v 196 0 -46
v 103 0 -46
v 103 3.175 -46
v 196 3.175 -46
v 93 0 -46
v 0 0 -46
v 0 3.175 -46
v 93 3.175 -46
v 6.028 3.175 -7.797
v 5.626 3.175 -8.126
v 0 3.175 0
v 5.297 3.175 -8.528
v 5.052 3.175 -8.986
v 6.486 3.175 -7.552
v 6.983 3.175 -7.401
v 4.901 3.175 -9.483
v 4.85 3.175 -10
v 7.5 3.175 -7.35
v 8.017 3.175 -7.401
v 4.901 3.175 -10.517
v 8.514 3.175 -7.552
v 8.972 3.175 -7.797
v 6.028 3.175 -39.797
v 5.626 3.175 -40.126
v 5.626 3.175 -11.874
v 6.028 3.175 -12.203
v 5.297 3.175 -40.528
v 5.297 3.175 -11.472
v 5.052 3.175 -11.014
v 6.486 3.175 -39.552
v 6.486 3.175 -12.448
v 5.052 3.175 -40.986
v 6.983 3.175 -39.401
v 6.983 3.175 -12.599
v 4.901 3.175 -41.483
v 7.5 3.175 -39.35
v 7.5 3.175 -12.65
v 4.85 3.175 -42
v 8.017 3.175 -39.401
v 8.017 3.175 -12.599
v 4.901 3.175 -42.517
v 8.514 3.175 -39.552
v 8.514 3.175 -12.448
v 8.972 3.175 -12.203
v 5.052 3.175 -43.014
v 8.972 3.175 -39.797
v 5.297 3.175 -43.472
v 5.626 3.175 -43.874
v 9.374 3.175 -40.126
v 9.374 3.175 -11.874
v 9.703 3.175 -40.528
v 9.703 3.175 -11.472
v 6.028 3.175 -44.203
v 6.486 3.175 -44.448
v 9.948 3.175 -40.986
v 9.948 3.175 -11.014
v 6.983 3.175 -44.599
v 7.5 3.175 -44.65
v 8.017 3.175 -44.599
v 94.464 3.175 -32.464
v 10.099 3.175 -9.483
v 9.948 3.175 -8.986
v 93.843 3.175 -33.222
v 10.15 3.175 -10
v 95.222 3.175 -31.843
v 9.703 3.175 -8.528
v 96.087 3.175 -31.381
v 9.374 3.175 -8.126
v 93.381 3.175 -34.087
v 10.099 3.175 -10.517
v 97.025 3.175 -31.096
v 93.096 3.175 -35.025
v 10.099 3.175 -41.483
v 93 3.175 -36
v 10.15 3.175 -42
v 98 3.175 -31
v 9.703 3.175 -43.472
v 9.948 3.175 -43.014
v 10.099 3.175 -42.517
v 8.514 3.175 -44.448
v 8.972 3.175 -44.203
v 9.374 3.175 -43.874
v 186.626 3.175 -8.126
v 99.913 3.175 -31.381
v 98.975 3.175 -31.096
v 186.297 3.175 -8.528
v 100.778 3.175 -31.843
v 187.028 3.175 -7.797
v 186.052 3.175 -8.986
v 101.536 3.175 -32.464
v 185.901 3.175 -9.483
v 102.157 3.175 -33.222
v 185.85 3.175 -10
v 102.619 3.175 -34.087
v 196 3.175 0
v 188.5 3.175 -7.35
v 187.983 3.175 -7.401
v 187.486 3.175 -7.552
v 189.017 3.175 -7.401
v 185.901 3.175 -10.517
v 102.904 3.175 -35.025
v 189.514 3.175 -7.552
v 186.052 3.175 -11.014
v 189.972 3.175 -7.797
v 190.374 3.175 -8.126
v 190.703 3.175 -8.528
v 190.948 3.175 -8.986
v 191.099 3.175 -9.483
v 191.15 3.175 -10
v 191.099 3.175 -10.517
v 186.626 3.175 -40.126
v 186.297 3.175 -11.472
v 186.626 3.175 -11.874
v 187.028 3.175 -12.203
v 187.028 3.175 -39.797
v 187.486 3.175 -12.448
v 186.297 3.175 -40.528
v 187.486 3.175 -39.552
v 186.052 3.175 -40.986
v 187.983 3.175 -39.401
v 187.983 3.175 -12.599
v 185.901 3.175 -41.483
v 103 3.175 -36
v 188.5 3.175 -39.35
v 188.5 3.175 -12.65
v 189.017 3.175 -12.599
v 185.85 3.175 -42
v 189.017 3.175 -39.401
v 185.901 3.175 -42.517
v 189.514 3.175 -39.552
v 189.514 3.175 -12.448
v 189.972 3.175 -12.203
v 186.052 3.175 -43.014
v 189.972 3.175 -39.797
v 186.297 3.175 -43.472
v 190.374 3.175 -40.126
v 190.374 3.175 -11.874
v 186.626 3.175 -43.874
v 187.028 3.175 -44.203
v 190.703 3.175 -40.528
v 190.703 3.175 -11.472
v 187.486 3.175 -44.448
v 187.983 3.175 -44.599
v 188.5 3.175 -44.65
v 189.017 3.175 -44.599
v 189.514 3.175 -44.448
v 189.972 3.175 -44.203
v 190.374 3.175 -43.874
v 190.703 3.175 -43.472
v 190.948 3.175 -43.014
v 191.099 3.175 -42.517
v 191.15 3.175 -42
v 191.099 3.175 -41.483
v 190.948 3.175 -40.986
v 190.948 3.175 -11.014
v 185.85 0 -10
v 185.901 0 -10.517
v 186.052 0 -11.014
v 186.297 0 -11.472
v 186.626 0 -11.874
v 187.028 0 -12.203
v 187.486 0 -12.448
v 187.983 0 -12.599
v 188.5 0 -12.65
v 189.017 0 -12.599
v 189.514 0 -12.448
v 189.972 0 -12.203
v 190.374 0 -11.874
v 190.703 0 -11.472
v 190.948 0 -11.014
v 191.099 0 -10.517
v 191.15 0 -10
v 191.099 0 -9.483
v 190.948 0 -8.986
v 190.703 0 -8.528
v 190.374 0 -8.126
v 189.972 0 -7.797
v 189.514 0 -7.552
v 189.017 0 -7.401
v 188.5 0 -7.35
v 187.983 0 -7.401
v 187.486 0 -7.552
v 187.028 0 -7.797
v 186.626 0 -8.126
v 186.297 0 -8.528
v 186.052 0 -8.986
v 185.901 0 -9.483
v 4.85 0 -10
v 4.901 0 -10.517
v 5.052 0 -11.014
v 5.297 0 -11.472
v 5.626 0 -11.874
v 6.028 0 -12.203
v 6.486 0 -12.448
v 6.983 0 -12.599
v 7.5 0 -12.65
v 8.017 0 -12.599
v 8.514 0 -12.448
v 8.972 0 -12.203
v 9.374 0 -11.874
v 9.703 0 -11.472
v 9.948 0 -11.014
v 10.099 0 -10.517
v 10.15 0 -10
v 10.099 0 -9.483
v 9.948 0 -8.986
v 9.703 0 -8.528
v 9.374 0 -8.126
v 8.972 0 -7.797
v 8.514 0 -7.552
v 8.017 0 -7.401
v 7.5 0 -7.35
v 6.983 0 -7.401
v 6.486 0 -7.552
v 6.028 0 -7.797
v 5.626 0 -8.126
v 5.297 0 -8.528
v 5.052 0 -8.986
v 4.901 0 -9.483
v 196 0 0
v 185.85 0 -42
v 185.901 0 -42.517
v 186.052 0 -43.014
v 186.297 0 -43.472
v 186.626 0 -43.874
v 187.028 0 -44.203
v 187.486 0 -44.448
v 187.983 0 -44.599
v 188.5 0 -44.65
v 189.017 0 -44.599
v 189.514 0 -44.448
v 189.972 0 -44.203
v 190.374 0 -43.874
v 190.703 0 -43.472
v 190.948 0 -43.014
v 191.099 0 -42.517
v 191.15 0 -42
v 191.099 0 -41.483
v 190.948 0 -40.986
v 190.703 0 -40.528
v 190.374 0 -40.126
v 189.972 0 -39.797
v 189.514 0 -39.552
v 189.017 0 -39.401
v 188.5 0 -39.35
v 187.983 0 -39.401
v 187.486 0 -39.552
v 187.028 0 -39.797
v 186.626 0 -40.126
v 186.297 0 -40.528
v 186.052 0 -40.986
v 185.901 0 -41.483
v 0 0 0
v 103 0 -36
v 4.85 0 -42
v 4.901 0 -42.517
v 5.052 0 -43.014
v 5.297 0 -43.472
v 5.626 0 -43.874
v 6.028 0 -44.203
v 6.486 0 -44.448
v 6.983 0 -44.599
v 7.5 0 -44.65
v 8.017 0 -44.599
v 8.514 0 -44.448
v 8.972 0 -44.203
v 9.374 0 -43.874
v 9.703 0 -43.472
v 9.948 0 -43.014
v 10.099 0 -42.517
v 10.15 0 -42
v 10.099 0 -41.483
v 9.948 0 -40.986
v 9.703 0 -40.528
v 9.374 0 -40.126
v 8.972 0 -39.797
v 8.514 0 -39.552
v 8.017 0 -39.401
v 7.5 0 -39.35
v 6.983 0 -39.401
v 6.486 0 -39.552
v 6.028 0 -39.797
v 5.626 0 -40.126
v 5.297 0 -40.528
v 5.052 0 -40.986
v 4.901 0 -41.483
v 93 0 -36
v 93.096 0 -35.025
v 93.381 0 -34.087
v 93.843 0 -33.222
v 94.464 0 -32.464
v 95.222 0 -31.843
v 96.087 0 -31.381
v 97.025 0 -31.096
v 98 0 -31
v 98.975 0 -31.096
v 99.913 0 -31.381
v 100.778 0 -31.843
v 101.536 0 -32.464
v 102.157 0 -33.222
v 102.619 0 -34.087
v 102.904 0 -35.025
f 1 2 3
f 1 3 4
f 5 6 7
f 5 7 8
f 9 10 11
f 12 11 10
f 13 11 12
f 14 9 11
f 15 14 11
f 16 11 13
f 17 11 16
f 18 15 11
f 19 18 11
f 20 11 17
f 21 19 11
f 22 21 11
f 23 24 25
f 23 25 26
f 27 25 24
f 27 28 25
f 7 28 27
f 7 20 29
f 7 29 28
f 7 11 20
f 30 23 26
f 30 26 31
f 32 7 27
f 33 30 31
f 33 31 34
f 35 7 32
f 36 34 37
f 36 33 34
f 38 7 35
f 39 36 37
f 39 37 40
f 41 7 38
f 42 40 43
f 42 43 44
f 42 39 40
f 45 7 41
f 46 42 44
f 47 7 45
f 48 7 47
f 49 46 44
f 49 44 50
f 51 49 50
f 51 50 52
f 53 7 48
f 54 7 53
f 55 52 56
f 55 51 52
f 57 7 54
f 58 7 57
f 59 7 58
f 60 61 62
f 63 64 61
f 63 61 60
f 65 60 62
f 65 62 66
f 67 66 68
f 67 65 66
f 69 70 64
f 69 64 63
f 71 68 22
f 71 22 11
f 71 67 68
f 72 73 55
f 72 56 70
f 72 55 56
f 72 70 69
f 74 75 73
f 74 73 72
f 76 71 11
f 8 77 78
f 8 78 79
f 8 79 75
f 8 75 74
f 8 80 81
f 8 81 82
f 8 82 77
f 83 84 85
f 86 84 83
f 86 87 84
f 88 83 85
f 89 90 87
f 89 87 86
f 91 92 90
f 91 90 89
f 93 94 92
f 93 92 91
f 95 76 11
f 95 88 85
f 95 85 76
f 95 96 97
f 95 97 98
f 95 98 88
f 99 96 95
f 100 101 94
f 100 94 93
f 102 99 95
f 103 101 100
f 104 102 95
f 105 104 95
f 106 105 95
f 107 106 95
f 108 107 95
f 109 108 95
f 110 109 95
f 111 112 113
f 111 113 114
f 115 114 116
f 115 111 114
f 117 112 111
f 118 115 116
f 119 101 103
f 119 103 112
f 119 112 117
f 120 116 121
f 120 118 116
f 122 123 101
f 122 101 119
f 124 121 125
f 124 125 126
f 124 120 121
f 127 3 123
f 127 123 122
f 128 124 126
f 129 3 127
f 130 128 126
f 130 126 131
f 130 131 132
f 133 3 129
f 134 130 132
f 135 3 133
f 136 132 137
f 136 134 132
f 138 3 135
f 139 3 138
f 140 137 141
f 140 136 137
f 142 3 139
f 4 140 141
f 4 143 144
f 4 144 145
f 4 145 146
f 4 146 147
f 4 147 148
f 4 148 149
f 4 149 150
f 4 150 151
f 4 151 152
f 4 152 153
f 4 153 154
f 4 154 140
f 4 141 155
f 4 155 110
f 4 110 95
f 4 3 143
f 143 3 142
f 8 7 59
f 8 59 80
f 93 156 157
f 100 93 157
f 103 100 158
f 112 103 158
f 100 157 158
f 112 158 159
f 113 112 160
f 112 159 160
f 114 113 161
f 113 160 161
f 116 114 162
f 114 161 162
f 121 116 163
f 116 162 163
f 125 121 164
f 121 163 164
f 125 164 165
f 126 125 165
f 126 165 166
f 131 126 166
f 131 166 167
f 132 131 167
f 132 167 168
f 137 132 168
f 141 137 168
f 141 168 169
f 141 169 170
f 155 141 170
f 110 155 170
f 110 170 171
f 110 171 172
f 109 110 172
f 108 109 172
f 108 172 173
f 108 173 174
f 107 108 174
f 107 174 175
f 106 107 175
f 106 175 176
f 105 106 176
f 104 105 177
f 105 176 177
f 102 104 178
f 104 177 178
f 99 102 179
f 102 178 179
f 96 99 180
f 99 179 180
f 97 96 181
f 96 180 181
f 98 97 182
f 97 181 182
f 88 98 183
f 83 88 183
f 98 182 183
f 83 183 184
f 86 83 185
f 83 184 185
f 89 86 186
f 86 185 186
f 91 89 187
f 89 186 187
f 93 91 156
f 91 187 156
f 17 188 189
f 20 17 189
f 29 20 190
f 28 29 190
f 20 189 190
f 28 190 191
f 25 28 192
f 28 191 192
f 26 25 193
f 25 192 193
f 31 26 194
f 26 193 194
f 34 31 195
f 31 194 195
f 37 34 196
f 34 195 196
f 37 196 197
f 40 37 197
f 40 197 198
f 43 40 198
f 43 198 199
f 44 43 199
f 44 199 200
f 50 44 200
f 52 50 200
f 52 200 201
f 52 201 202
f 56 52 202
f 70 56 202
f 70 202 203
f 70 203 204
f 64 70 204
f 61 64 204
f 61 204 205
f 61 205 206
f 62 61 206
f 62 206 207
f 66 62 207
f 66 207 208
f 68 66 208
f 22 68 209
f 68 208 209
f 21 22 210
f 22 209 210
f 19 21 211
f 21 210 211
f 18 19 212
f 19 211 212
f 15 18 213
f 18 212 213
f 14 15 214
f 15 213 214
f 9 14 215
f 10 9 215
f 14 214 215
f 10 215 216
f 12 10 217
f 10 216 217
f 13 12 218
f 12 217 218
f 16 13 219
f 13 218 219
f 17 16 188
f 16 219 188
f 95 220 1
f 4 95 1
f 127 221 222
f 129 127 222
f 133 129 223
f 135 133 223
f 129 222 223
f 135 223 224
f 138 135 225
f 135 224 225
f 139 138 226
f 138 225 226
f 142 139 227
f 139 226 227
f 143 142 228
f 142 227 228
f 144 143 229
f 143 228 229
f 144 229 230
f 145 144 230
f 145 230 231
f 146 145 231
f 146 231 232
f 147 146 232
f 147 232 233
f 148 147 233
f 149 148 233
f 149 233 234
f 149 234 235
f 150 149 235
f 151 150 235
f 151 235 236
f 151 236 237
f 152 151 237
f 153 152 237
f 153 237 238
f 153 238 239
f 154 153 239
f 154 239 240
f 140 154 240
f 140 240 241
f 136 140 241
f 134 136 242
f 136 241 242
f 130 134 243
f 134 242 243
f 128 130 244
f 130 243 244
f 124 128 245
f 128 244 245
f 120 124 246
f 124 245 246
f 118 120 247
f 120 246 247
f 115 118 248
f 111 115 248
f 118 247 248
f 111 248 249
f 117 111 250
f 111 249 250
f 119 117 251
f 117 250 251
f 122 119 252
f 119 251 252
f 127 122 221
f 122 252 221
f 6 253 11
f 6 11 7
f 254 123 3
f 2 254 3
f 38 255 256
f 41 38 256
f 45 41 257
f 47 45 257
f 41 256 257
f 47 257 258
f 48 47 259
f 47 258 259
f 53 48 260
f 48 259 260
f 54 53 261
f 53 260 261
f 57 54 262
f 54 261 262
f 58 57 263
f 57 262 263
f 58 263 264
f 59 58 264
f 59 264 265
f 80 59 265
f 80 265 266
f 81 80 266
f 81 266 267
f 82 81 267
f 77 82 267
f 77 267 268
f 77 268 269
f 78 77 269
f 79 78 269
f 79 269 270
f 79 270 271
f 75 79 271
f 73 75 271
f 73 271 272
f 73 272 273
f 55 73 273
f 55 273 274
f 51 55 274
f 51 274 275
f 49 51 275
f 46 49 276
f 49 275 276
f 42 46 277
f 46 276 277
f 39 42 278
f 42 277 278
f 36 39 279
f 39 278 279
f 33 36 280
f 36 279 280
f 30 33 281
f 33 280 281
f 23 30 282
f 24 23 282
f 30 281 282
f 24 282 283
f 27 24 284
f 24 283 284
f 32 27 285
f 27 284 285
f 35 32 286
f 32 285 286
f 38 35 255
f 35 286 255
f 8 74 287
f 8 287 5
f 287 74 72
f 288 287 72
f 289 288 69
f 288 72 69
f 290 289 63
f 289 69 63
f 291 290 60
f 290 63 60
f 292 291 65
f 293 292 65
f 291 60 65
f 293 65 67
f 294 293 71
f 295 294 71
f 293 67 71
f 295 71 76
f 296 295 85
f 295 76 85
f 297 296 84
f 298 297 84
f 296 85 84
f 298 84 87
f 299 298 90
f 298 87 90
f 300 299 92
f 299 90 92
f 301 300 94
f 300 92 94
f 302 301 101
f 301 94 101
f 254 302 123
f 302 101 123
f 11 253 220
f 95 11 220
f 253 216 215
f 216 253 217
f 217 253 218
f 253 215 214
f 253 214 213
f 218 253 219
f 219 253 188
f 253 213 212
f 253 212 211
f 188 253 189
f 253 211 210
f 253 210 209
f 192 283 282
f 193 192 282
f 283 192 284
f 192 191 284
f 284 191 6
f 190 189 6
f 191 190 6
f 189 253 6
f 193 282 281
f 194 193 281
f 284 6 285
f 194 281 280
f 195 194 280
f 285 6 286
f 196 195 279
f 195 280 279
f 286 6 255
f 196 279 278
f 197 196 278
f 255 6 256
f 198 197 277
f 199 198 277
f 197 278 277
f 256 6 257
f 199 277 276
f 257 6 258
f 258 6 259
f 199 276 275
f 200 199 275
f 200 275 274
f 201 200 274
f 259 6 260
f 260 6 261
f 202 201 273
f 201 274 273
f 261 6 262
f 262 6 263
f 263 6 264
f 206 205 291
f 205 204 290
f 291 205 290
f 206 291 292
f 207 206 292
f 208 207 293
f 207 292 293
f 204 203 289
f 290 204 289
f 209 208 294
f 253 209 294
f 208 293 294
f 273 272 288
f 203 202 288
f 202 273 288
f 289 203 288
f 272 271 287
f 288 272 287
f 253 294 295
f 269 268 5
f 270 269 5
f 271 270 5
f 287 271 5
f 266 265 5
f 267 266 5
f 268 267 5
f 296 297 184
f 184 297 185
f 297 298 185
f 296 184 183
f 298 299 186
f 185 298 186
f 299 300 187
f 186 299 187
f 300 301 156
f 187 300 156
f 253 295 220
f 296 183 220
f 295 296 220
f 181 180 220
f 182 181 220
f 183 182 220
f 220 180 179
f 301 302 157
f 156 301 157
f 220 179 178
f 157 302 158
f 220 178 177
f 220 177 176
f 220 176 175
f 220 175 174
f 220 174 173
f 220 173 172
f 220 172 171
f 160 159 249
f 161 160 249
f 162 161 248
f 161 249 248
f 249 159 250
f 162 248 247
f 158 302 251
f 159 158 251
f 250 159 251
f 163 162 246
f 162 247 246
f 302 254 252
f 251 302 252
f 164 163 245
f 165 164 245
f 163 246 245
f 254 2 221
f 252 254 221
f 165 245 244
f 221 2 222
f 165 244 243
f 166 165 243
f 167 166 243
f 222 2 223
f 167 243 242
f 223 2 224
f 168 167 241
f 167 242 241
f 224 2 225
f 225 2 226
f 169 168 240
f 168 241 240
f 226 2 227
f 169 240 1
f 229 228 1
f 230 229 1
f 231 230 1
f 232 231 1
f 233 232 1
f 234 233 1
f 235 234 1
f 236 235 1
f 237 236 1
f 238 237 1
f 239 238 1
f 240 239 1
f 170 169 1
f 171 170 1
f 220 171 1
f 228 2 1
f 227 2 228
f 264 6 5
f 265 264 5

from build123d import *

# Parameters (mm, degrees)
SKETCH1_W            = 196
SKETCH1_H            = 46
BOSS_EXTRUDE1_DEPTH  = 3.175
SKETCH2_W            = 10
SKETCH2_H            = 10
CUT_EXTRUDE1_DEPTH   = 3.175
M5_CLEARANCE_HOLE1_D = 5.3


with BuildPart() as part:
    # Sketch1 → Boss-Extrude1 (new body)
    with BuildSketch(Plane(origin=(0, 0, 0), x_dir=(1, 0, 0), z_dir=(0, 1, 0))):
        with Locations((98, 23)):
            Rectangle(SKETCH1_W, SKETCH1_H)
    extrude(amount=BOSS_EXTRUDE1_DEPTH)

    # Sketch2 → Cut-Extrude1 (cut)
    with BuildSketch(Plane(origin=(0, 3.175, 0), x_dir=(1, 0, 0), z_dir=(0, 1, 0))):
        with Locations((98, 41)):
            Rectangle(SKETCH2_W, SKETCH2_H)
        with BuildLine():
            ThreePointArc((93, 36), (98, 31), (103, 36))
            Line((103, 36), (93, 36))
        make_face()
    extrude(amount=-CUT_EXTRUDE1_DEPTH, mode=Mode.SUBTRACT)

    # M5 Clearance Hole1 (through all)
    with Locations(Plane(origin=(0, 3.175, 0), x_dir=(1, 0, 0), z_dir=(0, 1, 0))):
        with Locations((188.5, 10), (7.5, 10), (188.5, 42), (7.5, 42)):
            Hole(M5_CLEARANCE_HOLE1_D / 2)


solid = part.part
